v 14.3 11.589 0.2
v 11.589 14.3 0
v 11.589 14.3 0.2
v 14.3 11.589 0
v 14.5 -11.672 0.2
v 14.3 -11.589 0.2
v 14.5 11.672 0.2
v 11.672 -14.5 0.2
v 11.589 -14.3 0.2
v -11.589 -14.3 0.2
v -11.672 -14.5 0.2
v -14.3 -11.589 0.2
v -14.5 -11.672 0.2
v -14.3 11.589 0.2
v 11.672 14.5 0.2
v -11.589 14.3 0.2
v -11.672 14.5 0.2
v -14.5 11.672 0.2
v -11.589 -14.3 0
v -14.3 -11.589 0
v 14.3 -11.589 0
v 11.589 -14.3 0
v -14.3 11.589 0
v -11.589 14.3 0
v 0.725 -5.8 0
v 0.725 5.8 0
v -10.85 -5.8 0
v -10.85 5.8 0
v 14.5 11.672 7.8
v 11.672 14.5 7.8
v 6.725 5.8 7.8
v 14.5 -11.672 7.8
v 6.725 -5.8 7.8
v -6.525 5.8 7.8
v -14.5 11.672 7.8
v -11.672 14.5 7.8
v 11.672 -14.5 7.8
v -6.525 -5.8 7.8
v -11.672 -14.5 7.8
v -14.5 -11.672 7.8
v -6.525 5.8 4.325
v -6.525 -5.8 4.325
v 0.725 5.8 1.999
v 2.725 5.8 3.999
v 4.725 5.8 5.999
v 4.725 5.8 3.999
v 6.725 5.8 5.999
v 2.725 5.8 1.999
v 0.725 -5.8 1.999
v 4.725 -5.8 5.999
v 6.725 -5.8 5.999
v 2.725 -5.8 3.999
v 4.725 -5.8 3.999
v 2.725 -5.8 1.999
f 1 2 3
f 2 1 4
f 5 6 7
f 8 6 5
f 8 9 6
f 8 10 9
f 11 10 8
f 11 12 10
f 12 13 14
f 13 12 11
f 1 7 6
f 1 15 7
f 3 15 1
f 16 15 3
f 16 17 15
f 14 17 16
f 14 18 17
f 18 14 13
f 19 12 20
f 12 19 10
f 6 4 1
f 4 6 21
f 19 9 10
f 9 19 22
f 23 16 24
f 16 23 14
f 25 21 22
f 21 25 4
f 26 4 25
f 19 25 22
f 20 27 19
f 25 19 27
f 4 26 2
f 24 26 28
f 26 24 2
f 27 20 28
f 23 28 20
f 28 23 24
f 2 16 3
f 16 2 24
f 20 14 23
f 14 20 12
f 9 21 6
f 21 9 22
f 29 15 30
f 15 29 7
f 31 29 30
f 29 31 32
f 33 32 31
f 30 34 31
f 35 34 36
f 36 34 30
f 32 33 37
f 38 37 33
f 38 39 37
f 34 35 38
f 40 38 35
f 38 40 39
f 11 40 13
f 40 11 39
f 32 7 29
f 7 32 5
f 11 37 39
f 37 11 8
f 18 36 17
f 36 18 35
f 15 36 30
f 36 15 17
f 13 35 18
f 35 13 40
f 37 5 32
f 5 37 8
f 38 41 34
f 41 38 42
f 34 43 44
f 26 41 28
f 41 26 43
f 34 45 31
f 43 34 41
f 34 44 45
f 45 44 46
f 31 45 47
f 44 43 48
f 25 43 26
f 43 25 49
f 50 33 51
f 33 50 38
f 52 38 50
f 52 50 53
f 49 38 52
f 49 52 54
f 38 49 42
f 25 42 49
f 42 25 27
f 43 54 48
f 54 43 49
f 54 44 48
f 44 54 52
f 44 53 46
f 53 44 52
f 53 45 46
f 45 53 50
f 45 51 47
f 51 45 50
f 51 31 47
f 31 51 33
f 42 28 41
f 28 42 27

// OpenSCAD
eps = 0.001;
layer = 0.2;

width = 29; 
height = 7.8;

module exterior_2d() {
  difference() {
    square([width, width], center=true);
    
    // Chamfer corners.
    for (a = [-1, 1], b = [-1, 1])
      scale([a, b])
        translate([width/2, width/2])
          rotate([0, 0, 45])
            square(4, center=true);
  }
}

module exterior() {
  linear_extrude(layer)
    offset(-0.2)
      exterior_2d();
  translate([0, 0, layer])
    linear_extrude(height - layer)
      exterior_2d();
}

module down() {
  stair_width = 0.4;
  
  difference() {
    exterior();
    
    translate([-width*0.1, 0, 0]) {
      for (s = [0:4])
        translate([2*s, 0, 2*s - eps])
          linear_extrude(height*2)
            square(width * [0.25, stair_width], center=true);
    
      translate([-3, 0, 0])
        rotate([0, 45, 0])
          cube([7, width*stair_width, 7], center=true);
    }
  }
}

down();
